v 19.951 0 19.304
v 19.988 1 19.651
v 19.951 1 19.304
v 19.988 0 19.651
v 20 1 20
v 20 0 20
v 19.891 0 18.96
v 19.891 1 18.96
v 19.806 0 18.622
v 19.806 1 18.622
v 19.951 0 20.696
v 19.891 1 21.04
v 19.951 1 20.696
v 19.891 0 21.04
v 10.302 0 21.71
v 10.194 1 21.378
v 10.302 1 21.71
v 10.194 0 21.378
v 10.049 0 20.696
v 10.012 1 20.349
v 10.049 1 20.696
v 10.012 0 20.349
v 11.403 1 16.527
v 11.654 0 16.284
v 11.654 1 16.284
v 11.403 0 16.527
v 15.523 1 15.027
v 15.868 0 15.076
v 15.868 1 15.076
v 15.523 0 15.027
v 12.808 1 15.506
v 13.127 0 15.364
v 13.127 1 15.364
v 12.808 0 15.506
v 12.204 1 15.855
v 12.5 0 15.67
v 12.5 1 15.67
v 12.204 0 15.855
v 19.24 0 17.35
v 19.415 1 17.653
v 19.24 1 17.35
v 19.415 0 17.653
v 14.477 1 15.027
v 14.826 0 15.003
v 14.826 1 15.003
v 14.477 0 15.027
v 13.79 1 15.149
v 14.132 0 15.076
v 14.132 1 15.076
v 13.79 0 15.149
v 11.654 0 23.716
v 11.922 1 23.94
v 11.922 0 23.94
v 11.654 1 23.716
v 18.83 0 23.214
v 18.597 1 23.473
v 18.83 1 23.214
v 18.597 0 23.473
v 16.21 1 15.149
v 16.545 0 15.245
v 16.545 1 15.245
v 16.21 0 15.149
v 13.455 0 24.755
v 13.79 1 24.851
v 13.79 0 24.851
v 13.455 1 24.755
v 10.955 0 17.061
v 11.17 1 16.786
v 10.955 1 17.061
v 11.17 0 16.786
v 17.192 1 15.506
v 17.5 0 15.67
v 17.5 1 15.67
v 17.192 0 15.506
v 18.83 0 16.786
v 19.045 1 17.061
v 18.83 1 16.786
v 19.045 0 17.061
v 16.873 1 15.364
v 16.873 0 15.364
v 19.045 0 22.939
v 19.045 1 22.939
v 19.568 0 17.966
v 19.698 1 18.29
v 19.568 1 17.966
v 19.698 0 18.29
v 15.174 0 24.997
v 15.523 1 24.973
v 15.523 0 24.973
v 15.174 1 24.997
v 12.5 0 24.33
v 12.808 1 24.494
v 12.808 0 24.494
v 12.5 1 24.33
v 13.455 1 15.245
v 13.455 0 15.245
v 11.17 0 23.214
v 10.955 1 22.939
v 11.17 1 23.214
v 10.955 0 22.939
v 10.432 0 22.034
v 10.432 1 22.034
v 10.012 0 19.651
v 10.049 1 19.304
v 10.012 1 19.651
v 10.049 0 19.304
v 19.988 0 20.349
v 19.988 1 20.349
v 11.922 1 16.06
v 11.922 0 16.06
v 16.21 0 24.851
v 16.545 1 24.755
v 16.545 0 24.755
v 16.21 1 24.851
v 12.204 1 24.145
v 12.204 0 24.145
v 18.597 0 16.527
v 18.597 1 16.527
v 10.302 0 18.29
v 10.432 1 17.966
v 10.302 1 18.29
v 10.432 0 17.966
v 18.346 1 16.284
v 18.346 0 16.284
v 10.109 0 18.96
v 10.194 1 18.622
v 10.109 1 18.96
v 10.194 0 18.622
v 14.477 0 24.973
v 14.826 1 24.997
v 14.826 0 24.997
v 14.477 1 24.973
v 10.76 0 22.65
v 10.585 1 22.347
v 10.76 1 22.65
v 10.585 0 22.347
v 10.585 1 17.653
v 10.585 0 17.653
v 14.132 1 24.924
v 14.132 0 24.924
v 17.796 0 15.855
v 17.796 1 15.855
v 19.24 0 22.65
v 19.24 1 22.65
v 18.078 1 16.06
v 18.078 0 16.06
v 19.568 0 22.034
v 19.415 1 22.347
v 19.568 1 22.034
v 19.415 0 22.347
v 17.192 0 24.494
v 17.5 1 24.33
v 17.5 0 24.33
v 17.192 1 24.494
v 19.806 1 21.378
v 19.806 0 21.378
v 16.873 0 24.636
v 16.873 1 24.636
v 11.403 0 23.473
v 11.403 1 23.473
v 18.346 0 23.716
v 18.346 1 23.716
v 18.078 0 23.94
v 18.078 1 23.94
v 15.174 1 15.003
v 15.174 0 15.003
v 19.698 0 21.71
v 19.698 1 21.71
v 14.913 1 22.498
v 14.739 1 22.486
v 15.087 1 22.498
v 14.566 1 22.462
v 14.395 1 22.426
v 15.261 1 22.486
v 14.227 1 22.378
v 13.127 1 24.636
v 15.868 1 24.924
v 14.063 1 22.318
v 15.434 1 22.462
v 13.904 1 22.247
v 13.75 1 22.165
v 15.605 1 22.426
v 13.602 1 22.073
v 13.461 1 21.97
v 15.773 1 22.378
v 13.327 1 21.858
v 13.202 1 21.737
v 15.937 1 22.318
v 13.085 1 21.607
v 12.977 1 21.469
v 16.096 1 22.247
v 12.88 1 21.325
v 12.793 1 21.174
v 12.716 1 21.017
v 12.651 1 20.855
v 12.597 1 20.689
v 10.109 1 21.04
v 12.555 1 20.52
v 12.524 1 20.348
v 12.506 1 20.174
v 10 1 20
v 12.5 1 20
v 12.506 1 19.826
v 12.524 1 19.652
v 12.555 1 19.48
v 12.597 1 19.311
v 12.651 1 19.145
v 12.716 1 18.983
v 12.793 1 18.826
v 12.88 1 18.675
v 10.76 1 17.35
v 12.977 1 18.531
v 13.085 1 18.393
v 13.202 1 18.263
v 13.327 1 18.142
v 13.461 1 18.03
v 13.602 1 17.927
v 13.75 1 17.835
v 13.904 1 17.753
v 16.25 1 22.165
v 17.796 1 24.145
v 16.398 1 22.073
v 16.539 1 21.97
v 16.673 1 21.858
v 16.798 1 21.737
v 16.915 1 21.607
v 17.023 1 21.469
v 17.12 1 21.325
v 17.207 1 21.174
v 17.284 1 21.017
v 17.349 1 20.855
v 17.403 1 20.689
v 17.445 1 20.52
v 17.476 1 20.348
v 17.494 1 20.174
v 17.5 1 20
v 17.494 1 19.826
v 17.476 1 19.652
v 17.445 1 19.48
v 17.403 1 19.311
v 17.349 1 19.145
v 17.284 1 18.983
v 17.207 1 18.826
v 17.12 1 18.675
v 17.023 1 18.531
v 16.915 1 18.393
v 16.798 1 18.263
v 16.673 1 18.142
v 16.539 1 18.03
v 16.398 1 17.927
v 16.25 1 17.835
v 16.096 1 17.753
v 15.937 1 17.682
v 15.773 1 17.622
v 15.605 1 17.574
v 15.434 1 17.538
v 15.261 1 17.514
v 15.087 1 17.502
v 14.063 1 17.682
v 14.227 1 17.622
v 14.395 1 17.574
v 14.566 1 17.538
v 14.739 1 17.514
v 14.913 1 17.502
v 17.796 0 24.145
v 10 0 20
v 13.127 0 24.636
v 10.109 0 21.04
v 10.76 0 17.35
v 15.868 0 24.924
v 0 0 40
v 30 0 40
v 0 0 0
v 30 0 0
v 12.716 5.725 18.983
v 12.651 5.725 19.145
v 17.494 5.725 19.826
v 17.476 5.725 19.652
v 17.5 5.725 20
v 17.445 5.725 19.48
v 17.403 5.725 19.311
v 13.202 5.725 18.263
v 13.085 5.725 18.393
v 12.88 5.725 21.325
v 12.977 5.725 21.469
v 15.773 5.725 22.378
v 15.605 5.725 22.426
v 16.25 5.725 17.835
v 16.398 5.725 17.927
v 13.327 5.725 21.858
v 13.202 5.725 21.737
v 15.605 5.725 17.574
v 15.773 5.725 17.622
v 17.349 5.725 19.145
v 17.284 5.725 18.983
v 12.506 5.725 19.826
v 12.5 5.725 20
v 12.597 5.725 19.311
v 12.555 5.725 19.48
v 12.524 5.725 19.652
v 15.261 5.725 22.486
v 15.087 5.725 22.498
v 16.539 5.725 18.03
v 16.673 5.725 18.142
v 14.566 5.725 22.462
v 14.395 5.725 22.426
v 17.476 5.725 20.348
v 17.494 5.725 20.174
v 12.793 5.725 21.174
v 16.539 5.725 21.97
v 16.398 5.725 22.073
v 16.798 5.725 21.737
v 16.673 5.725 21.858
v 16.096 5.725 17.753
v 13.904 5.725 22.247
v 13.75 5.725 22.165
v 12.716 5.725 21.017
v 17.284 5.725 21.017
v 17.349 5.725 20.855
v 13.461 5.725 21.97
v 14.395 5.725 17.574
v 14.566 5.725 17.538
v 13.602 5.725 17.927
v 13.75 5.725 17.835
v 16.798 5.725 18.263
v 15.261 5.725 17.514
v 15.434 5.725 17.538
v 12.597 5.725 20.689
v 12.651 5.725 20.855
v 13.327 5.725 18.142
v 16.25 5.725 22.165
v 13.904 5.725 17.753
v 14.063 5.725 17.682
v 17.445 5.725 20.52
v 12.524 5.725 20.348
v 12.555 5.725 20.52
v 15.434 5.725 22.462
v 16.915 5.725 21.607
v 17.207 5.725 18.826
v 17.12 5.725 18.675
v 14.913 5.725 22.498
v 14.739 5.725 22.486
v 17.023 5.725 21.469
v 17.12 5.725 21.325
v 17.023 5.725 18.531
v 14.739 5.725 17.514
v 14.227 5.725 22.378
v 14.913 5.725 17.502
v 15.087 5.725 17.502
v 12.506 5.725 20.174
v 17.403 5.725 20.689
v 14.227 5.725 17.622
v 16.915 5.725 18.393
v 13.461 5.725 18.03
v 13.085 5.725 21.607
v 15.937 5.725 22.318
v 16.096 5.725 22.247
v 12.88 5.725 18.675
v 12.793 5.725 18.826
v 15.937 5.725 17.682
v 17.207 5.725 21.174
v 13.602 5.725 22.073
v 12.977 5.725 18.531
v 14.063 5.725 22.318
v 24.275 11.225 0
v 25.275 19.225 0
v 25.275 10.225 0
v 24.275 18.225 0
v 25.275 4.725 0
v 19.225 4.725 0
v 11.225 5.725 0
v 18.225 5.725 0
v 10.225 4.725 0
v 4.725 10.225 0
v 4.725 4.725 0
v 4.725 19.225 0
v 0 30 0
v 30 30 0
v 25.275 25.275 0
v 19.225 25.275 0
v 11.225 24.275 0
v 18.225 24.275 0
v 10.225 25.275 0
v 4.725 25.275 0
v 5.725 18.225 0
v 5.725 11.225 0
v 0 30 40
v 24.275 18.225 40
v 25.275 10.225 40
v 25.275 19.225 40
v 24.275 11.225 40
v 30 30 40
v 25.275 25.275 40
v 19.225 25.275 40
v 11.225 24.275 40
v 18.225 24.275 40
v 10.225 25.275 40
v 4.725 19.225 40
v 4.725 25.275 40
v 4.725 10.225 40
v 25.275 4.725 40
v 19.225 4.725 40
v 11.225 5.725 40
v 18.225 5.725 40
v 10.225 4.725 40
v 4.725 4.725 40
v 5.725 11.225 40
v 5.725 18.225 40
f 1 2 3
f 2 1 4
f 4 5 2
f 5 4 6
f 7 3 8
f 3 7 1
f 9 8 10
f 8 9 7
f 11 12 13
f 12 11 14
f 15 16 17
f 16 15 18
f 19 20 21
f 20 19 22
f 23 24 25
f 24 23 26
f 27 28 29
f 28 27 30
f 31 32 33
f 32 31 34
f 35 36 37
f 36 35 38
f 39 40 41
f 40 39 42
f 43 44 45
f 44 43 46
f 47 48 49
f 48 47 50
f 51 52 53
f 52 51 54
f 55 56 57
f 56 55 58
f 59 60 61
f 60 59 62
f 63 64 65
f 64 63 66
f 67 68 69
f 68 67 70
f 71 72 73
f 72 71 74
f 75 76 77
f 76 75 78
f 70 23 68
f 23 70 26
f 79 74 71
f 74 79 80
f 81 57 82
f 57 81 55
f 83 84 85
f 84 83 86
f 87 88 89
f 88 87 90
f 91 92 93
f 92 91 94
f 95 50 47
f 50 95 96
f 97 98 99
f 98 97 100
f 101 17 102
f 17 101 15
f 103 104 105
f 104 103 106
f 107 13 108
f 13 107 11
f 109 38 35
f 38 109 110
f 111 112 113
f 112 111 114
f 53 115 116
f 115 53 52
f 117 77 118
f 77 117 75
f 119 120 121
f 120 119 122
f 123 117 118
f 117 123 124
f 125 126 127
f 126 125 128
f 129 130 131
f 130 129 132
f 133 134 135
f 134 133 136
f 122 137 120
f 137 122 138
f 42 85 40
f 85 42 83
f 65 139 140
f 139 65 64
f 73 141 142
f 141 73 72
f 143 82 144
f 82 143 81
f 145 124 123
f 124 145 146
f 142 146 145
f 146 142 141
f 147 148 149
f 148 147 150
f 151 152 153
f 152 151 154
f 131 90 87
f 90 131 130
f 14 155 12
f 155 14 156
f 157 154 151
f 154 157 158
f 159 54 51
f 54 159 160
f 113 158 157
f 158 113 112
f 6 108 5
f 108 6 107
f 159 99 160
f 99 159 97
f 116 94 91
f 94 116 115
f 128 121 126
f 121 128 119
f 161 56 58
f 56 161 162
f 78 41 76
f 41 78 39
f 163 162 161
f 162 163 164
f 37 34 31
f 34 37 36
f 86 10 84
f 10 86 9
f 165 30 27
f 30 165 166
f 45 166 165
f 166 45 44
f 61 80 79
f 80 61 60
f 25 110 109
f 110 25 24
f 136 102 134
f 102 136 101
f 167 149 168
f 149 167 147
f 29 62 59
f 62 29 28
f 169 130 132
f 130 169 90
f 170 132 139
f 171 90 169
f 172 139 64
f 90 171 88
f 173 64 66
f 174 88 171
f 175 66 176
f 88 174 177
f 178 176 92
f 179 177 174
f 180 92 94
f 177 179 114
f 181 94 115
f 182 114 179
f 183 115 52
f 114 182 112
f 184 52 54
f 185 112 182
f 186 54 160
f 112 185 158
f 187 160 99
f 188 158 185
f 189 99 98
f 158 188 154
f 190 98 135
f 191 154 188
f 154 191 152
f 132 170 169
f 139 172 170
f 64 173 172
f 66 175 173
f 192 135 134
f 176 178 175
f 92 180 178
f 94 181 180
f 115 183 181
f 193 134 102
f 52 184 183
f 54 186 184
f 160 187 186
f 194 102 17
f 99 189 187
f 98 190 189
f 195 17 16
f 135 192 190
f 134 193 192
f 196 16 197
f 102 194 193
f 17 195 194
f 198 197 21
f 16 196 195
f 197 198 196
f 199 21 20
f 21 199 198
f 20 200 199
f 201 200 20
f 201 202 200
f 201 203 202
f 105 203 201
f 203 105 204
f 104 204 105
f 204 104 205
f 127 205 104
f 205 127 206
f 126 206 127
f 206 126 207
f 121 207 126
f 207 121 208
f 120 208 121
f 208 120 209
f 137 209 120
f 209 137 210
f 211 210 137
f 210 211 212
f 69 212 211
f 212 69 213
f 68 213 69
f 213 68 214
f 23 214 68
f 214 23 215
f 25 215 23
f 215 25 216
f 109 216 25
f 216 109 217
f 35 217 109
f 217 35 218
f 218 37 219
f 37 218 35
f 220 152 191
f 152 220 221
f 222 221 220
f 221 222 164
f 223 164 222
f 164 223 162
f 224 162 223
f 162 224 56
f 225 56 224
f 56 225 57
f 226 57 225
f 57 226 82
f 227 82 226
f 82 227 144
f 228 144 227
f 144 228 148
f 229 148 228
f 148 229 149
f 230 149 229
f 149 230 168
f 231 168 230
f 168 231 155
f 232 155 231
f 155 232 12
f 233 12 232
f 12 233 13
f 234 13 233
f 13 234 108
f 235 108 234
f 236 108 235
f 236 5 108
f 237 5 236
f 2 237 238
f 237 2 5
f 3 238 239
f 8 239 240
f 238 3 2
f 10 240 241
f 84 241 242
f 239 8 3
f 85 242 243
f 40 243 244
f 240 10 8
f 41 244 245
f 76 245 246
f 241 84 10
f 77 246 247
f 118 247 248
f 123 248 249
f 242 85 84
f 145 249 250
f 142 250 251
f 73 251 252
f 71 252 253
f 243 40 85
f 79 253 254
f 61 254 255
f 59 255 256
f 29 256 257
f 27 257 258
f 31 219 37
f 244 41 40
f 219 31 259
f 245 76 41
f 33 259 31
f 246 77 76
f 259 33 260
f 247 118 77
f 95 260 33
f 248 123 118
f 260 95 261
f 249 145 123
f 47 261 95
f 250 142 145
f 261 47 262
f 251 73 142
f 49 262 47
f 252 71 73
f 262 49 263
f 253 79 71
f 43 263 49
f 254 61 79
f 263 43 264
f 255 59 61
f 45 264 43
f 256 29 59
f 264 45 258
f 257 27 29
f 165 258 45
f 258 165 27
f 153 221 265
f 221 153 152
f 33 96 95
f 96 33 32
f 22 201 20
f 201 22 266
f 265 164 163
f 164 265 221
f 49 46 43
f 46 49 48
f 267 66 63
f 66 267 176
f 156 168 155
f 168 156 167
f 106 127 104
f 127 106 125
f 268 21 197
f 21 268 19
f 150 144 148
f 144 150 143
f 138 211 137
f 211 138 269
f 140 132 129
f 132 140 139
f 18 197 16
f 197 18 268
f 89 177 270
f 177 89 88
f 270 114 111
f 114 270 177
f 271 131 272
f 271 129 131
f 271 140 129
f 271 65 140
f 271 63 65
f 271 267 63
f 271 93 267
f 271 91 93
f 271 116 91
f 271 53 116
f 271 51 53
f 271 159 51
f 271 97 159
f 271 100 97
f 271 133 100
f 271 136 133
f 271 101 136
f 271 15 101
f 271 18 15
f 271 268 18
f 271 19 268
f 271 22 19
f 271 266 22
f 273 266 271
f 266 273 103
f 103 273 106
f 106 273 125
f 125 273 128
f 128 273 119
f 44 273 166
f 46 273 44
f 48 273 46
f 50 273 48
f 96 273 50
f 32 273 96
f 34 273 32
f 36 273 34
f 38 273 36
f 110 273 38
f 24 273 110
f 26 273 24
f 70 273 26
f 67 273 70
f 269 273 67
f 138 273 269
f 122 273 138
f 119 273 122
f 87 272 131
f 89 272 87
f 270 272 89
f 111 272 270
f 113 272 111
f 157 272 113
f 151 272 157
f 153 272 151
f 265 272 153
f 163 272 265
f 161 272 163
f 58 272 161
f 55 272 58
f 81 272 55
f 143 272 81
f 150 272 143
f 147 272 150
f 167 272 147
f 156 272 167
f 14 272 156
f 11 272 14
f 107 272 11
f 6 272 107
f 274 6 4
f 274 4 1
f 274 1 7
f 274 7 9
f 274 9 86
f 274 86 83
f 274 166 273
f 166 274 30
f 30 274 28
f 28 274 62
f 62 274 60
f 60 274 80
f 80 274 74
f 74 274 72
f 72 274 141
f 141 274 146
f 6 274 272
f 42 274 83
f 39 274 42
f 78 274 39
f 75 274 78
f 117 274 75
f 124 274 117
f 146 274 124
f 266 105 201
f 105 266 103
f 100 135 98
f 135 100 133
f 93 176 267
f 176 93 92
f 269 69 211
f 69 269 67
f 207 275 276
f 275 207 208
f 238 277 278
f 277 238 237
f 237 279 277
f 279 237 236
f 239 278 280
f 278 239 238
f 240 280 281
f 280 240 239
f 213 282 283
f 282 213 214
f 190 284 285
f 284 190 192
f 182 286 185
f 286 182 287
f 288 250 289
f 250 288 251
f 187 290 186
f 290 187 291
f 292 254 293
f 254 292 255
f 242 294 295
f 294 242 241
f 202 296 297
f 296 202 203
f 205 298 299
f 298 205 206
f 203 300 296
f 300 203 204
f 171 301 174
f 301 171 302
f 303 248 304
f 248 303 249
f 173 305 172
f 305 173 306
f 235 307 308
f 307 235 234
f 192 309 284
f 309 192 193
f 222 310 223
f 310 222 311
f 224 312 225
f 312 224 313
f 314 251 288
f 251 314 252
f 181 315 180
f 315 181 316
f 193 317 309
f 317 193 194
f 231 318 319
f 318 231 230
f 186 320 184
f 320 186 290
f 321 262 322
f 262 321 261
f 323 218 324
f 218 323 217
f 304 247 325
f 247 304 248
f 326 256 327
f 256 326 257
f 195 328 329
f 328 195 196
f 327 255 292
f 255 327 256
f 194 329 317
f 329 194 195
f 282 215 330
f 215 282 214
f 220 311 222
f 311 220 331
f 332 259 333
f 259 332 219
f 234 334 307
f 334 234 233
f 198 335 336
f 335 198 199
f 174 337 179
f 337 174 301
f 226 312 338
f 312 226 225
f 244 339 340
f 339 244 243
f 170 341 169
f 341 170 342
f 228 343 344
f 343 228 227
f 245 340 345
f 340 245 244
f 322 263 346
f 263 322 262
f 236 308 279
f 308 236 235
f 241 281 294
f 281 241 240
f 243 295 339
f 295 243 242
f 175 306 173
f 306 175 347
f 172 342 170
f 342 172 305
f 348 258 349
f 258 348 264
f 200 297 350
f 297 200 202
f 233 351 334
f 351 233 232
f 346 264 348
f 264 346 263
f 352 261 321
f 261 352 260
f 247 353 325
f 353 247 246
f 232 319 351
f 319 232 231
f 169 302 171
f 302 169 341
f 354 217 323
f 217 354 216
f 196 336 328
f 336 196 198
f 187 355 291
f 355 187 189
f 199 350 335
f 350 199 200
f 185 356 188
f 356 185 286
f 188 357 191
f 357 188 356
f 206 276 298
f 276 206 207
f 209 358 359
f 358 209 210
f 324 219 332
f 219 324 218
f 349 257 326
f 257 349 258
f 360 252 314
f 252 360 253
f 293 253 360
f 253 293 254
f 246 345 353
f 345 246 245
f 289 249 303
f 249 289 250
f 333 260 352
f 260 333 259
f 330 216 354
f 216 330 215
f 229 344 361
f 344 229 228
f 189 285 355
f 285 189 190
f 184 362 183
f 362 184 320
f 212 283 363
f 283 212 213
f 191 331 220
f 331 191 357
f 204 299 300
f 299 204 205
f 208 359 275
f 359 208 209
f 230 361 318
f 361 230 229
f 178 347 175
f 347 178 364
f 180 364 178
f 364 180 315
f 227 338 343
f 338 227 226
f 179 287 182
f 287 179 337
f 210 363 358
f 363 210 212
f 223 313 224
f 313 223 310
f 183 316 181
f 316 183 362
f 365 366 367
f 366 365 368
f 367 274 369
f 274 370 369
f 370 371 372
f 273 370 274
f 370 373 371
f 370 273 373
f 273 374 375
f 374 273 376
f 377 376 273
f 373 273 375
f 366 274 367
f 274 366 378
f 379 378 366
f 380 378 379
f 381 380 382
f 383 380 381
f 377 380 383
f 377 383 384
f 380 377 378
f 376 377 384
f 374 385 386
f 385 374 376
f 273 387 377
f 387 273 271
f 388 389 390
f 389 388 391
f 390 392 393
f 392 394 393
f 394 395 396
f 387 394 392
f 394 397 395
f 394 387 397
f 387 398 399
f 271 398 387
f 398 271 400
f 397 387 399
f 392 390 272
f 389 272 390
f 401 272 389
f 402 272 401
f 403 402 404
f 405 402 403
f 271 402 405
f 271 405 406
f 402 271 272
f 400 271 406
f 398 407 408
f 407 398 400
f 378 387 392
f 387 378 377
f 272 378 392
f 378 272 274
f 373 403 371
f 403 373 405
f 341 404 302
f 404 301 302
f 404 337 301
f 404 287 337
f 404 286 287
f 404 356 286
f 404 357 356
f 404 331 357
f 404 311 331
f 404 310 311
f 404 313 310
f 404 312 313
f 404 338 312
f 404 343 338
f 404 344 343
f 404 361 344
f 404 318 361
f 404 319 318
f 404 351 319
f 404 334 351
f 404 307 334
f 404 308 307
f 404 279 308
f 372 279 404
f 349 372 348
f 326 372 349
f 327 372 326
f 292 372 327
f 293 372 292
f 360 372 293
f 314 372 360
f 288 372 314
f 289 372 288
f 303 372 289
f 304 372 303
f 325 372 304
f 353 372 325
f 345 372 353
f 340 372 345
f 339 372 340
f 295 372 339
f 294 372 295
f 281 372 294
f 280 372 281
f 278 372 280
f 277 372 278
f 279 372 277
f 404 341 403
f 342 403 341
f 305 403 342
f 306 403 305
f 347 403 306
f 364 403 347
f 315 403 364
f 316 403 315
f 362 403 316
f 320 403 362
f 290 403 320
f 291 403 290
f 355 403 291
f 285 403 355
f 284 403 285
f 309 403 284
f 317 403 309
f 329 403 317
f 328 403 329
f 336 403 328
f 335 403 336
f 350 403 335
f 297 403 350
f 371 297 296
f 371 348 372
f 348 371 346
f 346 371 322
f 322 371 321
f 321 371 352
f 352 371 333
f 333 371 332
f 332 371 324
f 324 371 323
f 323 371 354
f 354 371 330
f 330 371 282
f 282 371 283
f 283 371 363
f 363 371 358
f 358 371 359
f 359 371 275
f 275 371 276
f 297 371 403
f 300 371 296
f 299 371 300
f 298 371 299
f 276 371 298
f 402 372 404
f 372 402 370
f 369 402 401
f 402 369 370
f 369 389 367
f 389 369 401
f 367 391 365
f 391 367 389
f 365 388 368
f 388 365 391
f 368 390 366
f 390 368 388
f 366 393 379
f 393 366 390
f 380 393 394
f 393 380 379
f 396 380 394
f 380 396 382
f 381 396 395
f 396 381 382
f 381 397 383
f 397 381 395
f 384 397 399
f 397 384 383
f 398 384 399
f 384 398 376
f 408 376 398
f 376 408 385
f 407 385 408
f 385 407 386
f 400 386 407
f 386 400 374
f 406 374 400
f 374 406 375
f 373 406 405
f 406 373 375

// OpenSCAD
testPiece = true;
xExtrusionWidthSections = 2;
xExtrusionDepthSections = 1;
xExtrusionLength = 70;
xEndClosed = true;
yExtrusionWidthSections = 2;
yExtrusionDepthSections = 1;
yExtrusionLength = 70;
yEndClosed = true;
zExtrusionWidthSections = 1;
zExtrusionDepthSections = 1;
zExtrusionLength = 40;
zEndClosed = true;
tolerance=0.55;
lengthHoleSpacing=30;
wallWidth=5;
vslotIndentHeight=1;
sectionWidth=20;

if (testPiece) {
    difference() {
        linear_extrude(height=zExtrusionLength)
            square([
                sectionWidth*zExtrusionWidthSections+wallWidth*2,
                sectionWidth*zExtrusionDepthSections+wallWidth*2
            ]);
        translate([wallWidth, wallWidth, 0]) {
            linear_extrude(height=zExtrusionLength)
            VSlot2dProfile(
                sectionCountWidth=zExtrusionWidthSections, 
                sectionCountDepth=zExtrusionDepthSections,
                indentHeight=vslotIndentHeight,
                tolerance=tolerance
            );
        };  
        negativeSpaceHoles(
            extrusionLength=zExtrusionLength,
            fullIndentHeight=wallWidth+vslotIndentHeight,
            firstIndentOffset=wallWidth,
            widthSections=zExtrusionWidthSections,
            lengthHoleSpacing=lengthHoleSpacing
        );
    };
}
else {
    ThreeCornerVslot(
        sectionWidth = sectionWidth,
        wallWidth = wallWidth,
        vslotIndentHeight = vslotIndentHeight,
        xExtrusionWidthSections = xExtrusionWidthSections,
        xExtrusionDepthSections = xExtrusionDepthSections,
        xExtrusionLength = xExtrusionLength,
        xEndClosed = xEndClosed,
        yExtrusionWidthSections = yExtrusionWidthSections,
        yExtrusionDepthSections = yExtrusionDepthSections,
        yExtrusionLength = yExtrusionLength,
        yEndClosed = yEndClosed,
        zExtrusionWidthSections = zExtrusionWidthSections,
        zExtrusionDepthSections = zExtrusionDepthSections,
        zExtrusionLength = zExtrusionLength,
        zEndClosed = zEndClosed,
        tolerance = tolerance,
        lengthHoleSpacing = lengthHoleSpacing
    );
}

module extrusionIndent(_indentWidthInside, _indentWidthOutside, _indentHeight) {
    polygon(points=[
            [0,0], 
            [(_indentWidthOutside-_indentWidthInside)/2, _indentHeight], 
            [_indentWidthInside + (_indentWidthOutside-_indentWidthInside)/2, _indentHeight],
            [_indentWidthOutside, 0]
        ]);
};

module VSlot2dProfile(
    extrusionLength = 50,
    sectionWidth = 20,
    indentWidthOutside = 9,
    indentWidthInside = 7,
    indentHeight = 1,
    sectionCountWidth = 3,
    sectionCountDepth = 1,
    topIndent = true,
    bottomIndent = true,
    leftIndent = true,
    rightIndent = true,
    tolerance = 0.8
)
{
    translate([-tolerance/2,-tolerance/2,0]) difference() {
        
            square(
                size=[
                    sectionWidth*sectionCountWidth+tolerance, 
                    sectionWidth*sectionCountDepth+tolerance
                ]
            );
        for(i = [0:sectionCountWidth]) {
            // bottom indents
            if (bottomIndent) 
                translate([i * sectionWidth + (sectionWidth-indentWidthOutside)/2, 0, 0])
                extrusionIndent(indentWidthInside,indentWidthOutside,indentHeight);
            
            // top indents
            if (topIndent)
                translate([
                    i * sectionWidth + (sectionWidth-indentWidthOutside)/2, 
                    sectionWidth*sectionCountDepth+tolerance, 
                    0
                ])
                rotate([180,0,0])
                extrusionIndent(indentWidthInside,indentWidthOutside,indentHeight);
        }
        for(i = [0:sectionCountDepth]) {
            // left side indent
            if (leftIndent)
                translate([0, (i+1) * sectionWidth - (sectionWidth-indentWidthOutside)/2, 0])
                rotate([0,0,-90]) 
                extrusionIndent(indentWidthInside,indentWidthOutside,indentHeight);
            
            // right side inden
            if (rightIndent)
                translate([
                    sectionWidth*sectionCountWidth + tolerance, 
                    i * sectionWidth + (sectionWidth-indentWidthOutside)/2, 
                    0
                ])
                rotate([0,0,90]) 
                extrusionIndent(indentWidthInside,indentWidthOutside,indentHeight);
        }
    }
};

module negativeSpaceHoles(
    largeHoleIndent = 1,
    largeHoleRadius = 5,
    smallHoleRadius = 2.5,
    widthHoleSpacing = 20,
    lengthHoleSpacing,
    extrusionLength,
    fullIndentHeight,
    firstIndentOffset,
    widthSections
    ) 
{
    for (p = [lengthHoleSpacing/2+firstIndentOffset:lengthHoleSpacing:extrusionLength-firstIndentOffset-lengthHoleSpacing/2]) {
        translate([0,0,p]) 
        for (s = [firstIndentOffset+widthHoleSpacing/2:widthHoleSpacing:widthHoleSpacing*widthSections]) {
            translate([s,0,0])
            rotate([-90,0,0]) {
                cylinder(h=largeHoleIndent,r=largeHoleRadius,center=false, $fn=90);
                cylinder(h=fullIndentHeight,r=smallHoleRadius,center=false, $fn=90);
            };
        }
    };
}

module ThreeCornerVslot(
    sectionWidth = 20,
    wallWidth = 5,
    vslotIndentHeight = 1,
    xExtrusionWidthSections = 2,
    xExtrusionDepthSections = 1,
    xExtrusionLength = 70,
    xEndClosed = true,
    yExtrusionWidthSections = 2,
    yExtrusionDepthSections = 1,
    yExtrusionLength = 70,
    yEndClosed = true,
    zExtrusionWidthSections = 1,
    zExtrusionDepthSections = 2,
    zExtrusionLength = 70,
    zEndClosed = true,
    tolerance=0.8,
    lengthHoleSpacing = 20,
)
{
    xEndOffset = 
        xEndClosed 
        ? wallWidth+vslotIndentHeight
        : 2*wallWidth + sectionWidth*zExtrusionWidthSections;
    yEndOffset = 
        yEndClosed 
        ? vslotIndentHeight
        : wallWidth + sectionWidth*zExtrusionDepthSections;
    zEndOffset = zEndClosed ? wallWidth : 0;
    
    difference() {
        hull() { 
            linear_extrude(height=zExtrusionLength)
                square([
                    sectionWidth*zExtrusionWidthSections+wallWidth*2,
                    sectionWidth*zExtrusionDepthSections+wallWidth*2
                ]);
            rotate([0,-90,0]) 
                linear_extrude(height=xExtrusionLength)
                square([
                    sectionWidth*xExtrusionWidthSections + 2*wallWidth,
                    wallWidth
                ]);
            
            translate([sectionWidth*zExtrusionWidthSections + wallWidth,
                    sectionWidth*zExtrusionDepthSections + wallWidth,
                    0
                ])
                rotate([-90,-90,0])
                linear_extrude(height=yExtrusionLength)
                square([
                    sectionWidth*yExtrusionWidthSections + 2*wallWidth,
                    wallWidth
                ]);
        };
        
        translate([wallWidth, wallWidth, zEndOffset]) {
            linear_extrude(height=zExtrusionLength-zEndOffset)
            VSlot2dProfile(
                sectionCountWidth=zExtrusionWidthSections, 
                sectionCountDepth=zExtrusionDepthSections,
                indentHeight=vslotIndentHeight,
                tolerance=tolerance
            );
        };  
        negativeSpaceHoles(
            extrusionLength=zExtrusionLength,
            fullIndentHeight=wallWidth+vslotIndentHeight,
            firstIndentOffset=wallWidth,
            widthSections=zExtrusionWidthSections,
            lengthHoleSpacing=lengthHoleSpacing
        );

        rotate([0,-90,0]) {
            translate([wallWidth, wallWidth, -xEndOffset]) 
                linear_extrude(height=xExtrusionLength+xEndOffset)
                VSlot2dProfile(
                    sectionCountWidth=xExtrusionWidthSections, 
                    sectionCountDepth=xExtrusionDepthSections,
                    indentHeight=vslotIndentHeight,
                    tolerance=tolerance
                );
            negativeSpaceHoles(
                extrusionLength=xExtrusionLength,
                fullIndentHeight=wallWidth+vslotIndentHeight,
                firstIndentOffset=wallWidth,
                widthSections=xExtrusionWidthSections,
                lengthHoleSpacing=lengthHoleSpacing
            );
        };
            
        translate([zExtrusionWidthSections*sectionWidth+wallWidth*2,0,0])
        rotate([0,0,90])
            negativeSpaceHoles(
                extrusionLength=zExtrusionLength,
                fullIndentHeight=wallWidth+vslotIndentHeight,
                firstIndentOffset=wallWidth,
                widthSections=zExtrusionDepthSections,
                lengthHoleSpacing=lengthHoleSpacing
            );
        
        translate([
            sectionWidth*(zExtrusionWidthSections-yExtrusionDepthSections),
            sectionWidth*zExtrusionDepthSections+wallWidth-yEndOffset,
            0])
        {
            rotate([-90,-90,0]) {
                translate([wallWidth, wallWidth, 0])
                linear_extrude(height=yExtrusionLength+yEndOffset)
                VSlot2dProfile(
                    sectionCountWidth=yExtrusionWidthSections, 
                    sectionCountDepth=yExtrusionDepthSections,
                    indentHeight=vslotIndentHeight,
                    tolerance=tolerance
                );             
            };
        };
            
          
        translate([sectionWidth*zExtrusionWidthSections + wallWidth*2,
                sectionWidth*zExtrusionDepthSections + wallWidth,
                sectionWidth*yExtrusionWidthSections + wallWidth*2
            ])
            rotate([0,90,90])
            negativeSpaceHoles(
                extrusionLength=yExtrusionLength,
                fullIndentHeight=wallWidth+vslotIndentHeight,
                firstIndentOffset=wallWidth,
                widthSections=yExtrusionWidthSections,
                lengthHoleSpacing=lengthHoleSpacing
            );
          
    };   
}
        
